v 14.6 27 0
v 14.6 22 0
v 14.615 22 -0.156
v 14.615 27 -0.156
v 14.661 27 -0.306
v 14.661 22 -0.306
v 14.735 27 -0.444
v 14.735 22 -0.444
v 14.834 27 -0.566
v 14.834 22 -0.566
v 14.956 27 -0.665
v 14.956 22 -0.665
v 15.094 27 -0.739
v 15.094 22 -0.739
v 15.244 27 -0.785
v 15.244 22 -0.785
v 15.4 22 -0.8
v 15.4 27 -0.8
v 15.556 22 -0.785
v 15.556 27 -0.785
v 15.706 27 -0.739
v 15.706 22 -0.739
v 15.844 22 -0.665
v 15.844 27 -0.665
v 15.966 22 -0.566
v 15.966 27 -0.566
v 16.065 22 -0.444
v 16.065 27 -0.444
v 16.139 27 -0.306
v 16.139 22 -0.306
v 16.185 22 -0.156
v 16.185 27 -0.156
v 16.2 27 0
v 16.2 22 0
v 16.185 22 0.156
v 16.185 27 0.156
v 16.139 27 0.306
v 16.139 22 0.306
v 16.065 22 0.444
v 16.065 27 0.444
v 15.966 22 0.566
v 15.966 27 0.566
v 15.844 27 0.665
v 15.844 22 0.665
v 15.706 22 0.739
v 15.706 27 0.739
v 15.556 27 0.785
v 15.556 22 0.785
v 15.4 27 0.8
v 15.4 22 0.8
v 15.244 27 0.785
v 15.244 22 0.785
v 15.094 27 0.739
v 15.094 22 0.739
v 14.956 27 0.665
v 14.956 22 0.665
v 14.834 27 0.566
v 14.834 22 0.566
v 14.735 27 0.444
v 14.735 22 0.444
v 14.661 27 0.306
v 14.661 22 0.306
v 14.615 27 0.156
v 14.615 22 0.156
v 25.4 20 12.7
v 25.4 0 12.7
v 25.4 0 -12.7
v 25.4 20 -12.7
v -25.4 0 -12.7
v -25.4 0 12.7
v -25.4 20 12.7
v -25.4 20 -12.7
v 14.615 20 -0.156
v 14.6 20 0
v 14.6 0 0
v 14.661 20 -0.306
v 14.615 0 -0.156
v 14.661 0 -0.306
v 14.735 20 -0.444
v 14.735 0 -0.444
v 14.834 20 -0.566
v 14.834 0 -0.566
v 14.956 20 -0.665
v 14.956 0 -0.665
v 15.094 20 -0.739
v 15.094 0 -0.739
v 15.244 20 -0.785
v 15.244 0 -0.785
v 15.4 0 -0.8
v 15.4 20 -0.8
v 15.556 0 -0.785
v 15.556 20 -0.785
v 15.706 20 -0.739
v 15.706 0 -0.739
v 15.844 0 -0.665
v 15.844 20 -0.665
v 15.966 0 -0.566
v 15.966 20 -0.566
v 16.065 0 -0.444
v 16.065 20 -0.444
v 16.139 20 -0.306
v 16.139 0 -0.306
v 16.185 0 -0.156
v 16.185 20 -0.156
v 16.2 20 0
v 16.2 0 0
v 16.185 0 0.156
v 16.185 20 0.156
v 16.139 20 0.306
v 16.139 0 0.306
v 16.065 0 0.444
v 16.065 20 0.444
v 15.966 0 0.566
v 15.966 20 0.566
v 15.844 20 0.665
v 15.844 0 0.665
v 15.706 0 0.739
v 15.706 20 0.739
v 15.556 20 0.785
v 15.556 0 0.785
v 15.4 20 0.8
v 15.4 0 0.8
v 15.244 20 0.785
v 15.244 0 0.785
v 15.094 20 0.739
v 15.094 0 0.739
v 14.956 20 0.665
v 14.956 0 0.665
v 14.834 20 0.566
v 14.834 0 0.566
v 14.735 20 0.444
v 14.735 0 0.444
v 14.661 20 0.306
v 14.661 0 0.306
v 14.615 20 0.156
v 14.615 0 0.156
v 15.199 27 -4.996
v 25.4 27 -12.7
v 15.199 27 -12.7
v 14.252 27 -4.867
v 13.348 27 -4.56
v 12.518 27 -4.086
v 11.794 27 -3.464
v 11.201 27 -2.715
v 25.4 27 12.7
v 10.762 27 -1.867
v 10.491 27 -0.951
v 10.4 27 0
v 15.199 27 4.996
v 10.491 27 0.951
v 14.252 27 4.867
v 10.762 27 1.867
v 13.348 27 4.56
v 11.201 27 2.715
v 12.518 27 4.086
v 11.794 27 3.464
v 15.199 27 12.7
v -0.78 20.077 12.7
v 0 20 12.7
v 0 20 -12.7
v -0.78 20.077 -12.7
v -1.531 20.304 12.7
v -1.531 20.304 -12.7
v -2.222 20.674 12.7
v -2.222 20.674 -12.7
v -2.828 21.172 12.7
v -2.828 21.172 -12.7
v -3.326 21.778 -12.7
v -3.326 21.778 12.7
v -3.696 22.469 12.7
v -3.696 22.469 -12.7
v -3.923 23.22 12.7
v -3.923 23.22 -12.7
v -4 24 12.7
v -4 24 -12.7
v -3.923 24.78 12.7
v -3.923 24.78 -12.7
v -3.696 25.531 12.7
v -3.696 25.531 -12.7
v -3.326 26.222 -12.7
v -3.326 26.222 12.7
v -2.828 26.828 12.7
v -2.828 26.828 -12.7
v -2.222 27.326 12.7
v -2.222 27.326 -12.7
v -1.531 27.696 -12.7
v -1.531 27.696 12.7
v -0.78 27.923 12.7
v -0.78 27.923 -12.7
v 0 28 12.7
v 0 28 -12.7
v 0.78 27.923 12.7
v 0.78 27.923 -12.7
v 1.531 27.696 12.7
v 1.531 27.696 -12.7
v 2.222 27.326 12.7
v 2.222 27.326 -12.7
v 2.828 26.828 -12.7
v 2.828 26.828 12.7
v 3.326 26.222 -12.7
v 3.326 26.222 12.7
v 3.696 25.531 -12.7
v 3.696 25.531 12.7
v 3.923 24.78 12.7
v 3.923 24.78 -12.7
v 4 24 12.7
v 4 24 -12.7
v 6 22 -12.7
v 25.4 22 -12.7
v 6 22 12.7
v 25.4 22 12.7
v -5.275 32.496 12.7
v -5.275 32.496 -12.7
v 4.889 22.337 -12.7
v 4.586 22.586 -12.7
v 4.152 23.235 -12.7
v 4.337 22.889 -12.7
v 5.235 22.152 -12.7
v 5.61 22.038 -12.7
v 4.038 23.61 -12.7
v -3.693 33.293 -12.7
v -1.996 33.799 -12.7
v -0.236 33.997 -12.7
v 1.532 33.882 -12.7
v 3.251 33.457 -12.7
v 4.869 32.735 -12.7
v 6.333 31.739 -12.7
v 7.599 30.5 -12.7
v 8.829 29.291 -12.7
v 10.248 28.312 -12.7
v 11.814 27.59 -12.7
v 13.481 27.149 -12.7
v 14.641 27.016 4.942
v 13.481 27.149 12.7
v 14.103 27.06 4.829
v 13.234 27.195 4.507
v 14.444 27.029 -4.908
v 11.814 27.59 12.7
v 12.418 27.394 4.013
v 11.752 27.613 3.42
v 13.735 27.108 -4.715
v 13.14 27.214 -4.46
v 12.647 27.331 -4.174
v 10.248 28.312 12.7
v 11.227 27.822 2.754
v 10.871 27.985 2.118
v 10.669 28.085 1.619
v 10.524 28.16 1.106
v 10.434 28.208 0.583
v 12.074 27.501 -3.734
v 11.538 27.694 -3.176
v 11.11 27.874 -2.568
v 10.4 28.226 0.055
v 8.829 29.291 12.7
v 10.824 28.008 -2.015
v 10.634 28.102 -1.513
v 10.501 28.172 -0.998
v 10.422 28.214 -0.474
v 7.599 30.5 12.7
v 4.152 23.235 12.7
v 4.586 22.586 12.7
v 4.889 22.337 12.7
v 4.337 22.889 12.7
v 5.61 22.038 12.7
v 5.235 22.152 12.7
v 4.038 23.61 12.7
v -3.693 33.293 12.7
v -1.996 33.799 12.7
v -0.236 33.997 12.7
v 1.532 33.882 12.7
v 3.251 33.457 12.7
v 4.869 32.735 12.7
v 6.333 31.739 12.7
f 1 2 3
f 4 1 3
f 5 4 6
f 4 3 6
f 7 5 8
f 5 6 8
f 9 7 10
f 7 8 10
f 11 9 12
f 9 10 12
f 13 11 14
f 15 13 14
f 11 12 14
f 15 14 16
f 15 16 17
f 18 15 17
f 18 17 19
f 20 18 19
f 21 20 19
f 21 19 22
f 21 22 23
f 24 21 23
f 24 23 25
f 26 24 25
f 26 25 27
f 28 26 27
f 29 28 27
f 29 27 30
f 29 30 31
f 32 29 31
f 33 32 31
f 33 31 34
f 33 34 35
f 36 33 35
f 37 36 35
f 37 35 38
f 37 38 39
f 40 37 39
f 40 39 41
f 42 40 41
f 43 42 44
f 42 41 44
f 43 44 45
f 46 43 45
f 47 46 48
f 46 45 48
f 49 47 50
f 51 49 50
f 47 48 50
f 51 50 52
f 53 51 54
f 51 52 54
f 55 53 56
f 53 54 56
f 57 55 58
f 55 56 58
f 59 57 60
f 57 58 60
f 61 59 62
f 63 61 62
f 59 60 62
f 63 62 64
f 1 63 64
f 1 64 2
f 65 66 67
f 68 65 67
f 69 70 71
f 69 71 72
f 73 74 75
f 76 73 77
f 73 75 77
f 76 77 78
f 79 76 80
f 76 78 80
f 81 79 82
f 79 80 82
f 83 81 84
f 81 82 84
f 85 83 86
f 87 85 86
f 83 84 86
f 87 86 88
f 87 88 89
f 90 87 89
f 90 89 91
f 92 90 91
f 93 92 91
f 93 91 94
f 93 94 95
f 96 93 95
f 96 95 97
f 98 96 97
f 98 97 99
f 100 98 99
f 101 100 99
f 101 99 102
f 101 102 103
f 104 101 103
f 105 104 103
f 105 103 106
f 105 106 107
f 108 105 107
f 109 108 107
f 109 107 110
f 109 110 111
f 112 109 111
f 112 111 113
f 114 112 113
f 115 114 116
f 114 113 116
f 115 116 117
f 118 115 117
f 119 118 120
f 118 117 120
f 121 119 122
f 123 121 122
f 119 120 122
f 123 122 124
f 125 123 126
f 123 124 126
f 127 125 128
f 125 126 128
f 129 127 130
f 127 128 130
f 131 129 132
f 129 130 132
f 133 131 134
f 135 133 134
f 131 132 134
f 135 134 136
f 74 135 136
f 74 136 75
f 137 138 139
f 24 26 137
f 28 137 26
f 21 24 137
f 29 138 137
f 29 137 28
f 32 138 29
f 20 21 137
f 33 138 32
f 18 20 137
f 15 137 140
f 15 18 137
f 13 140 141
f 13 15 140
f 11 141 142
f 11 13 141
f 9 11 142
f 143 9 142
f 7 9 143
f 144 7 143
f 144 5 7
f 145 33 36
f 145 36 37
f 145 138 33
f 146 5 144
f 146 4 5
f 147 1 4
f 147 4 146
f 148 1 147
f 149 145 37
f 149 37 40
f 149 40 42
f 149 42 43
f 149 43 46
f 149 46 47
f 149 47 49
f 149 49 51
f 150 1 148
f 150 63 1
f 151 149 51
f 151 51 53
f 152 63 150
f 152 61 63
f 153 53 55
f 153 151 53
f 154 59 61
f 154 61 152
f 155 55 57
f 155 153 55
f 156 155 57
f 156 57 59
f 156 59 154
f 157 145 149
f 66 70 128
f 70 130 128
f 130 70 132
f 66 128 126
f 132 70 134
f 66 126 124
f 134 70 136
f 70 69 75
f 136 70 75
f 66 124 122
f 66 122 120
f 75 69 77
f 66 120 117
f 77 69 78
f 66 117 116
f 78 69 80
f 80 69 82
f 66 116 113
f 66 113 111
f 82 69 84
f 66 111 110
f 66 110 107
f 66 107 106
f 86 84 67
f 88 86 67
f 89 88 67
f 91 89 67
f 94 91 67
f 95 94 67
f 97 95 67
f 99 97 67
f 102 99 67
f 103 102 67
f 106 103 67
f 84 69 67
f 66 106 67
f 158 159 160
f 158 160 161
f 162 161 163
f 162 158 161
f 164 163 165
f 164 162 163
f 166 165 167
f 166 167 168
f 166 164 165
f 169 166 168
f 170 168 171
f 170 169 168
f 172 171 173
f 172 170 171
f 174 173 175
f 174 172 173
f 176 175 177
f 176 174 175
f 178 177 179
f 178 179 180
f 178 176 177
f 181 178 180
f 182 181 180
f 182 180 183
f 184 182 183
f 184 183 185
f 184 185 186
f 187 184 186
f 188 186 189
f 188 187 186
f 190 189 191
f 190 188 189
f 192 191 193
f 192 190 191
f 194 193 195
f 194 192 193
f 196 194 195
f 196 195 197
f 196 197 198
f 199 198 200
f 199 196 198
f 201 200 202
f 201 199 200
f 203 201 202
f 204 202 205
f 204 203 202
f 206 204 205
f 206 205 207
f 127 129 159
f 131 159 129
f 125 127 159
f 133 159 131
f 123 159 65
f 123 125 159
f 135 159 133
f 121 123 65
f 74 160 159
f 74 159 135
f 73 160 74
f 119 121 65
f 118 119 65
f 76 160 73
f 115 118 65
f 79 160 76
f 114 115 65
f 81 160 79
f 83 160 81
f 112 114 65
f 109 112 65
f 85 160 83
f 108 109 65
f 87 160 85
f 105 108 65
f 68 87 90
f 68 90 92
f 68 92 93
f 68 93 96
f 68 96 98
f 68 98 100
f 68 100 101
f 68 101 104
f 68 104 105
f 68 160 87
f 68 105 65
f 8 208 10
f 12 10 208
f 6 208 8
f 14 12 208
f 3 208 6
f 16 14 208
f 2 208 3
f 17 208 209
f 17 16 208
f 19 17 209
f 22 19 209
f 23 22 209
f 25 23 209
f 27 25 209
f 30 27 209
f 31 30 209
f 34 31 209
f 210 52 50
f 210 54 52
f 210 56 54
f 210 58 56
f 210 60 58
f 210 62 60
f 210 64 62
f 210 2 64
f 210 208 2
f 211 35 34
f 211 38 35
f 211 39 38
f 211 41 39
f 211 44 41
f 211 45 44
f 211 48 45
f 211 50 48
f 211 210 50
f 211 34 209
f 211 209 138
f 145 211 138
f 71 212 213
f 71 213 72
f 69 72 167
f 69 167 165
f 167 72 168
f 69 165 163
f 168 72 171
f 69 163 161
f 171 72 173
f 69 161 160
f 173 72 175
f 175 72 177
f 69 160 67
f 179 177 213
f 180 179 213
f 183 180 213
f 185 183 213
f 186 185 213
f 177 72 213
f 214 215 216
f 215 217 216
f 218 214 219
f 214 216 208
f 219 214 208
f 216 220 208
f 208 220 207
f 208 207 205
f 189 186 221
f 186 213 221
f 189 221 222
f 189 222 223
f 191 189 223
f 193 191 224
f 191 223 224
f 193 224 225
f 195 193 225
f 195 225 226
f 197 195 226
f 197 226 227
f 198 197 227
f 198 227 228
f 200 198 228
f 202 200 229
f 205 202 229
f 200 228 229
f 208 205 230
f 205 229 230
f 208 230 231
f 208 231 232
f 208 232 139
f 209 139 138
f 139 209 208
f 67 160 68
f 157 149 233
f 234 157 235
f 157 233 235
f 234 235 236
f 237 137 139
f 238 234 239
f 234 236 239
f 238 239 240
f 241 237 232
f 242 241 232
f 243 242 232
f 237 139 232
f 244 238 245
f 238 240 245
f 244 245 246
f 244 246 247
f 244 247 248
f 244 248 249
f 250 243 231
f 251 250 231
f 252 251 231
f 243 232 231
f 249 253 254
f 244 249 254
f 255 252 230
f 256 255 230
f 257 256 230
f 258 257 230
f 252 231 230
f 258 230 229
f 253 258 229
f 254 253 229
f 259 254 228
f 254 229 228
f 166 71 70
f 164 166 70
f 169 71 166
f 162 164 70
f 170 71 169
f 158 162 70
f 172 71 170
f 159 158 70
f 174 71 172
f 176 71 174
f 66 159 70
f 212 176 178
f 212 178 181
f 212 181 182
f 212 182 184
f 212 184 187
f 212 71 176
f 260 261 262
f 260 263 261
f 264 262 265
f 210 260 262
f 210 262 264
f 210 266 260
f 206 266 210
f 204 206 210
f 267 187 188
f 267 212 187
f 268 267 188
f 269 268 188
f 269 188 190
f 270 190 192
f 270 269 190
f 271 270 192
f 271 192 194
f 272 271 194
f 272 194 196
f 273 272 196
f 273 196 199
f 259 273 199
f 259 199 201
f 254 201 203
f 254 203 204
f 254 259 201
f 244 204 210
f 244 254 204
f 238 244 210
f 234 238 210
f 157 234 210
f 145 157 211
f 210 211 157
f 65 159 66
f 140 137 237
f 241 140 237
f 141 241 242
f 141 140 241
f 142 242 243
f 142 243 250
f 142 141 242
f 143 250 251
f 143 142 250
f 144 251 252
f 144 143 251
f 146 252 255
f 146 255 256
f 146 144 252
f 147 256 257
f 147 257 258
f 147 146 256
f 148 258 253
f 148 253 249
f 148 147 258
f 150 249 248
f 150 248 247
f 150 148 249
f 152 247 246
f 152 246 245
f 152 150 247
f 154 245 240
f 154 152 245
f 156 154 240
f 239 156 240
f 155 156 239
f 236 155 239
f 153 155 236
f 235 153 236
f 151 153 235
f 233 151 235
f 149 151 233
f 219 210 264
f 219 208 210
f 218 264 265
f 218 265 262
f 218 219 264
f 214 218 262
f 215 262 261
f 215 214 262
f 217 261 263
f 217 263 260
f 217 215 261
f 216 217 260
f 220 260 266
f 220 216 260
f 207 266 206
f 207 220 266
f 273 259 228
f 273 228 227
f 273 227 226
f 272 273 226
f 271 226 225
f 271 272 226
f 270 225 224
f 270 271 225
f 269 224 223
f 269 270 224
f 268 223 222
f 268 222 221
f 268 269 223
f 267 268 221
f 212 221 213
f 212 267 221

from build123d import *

# Parameters (mm, degrees)
SKETCH1_W                   = 50.8
SKETCH1_H                   = 25.4
BOSS_EXTRUDE1_DEPTH         = 20
BOSS_EXTRUDE2_DEPTH         = 25.4
FILLET1_R                   = 10
FILLET2_R                   = 2
SKETCH3_R                   = 5
CUT_EXTRUDE1_DEPTH          = 40.184818489
TAP_DRILL_FOR_M2X0_4_TAP1_D = 1.6


with BuildPart() as part:
    # Sketch1 → Boss-Extrude1 (new body)
    with BuildSketch(Plane(origin=(0, 0, 0), x_dir=(1, 0, 0), z_dir=(0, 1, 0))):
        Rectangle(SKETCH1_W, SKETCH1_H)
    extrude(amount=BOSS_EXTRUDE1_DEPTH)

    # Sketch2 → Boss-Extrude2 (add, through all)
    with BuildSketch(Plane.XY.offset(12.7)):
        with BuildLine():
            Line((3.464101615, 22), (25.4, 22))
            Line((25.4, 22), (25.4, 27))
            Line((25.4, 27), (9.539392014, 27))
            ThreePointArc((9.539392014, 27), (3.478061726, 33.375664597), (-5.274899627, 32.495612628))
            Line((-5.274899627, 32.495612628), (-25.4, 20))
            Line((-25.4, 20), (-4.8e-08, 20))
            ThreePointArc((-4.8e-08, 20), (-2.828427108, 26.828427142), (4, 24))
            ThreePointArc((4, 24), (3.863703305, 22.96472382), (3.464101615, 22))
        make_face()
    extrude(amount=-BOSS_EXTRUDE2_DEPTH)

    # Fillet1
    fillet1_edges = [part.edges().sort_by_distance(p)[0] for p in [
        (9.539392014, 27, 0),
    ]]
    fillet(fillet1_edges, radius=FILLET1_R)

    # Fillet2
    fillet2_edges = [part.edges().sort_by_distance(p)[0] for p in [
        (3.464101615, 22, 0),
    ]]
    fillet(fillet2_edges, radius=FILLET2_R - 0.0001)  # a hair under: the kernel refuses the full size

    # Sketch3 → Cut-Extrude1 (cut, through all)
    with BuildSketch(Plane(origin=(0, 27, 0), x_dir=(1, 0, 0), z_dir=(0, 1, 0))):
        with Locations((15.4, 0)):
            Circle(SKETCH3_R)
    extrude(amount=CUT_EXTRUDE1_DEPTH, mode=Mode.SUBTRACT)

    # Tap Drill for M2x0.4 Tap1 (through all)
    with Locations(Plane(origin=(0, 27, 0), x_dir=(1, 0, 0), z_dir=(0, 1, 0))):
        with Locations((15.4, 0)):
            Hole(TAP_DRILL_FOR_M2X0_4_TAP1_D / 2)


solid = part.part
